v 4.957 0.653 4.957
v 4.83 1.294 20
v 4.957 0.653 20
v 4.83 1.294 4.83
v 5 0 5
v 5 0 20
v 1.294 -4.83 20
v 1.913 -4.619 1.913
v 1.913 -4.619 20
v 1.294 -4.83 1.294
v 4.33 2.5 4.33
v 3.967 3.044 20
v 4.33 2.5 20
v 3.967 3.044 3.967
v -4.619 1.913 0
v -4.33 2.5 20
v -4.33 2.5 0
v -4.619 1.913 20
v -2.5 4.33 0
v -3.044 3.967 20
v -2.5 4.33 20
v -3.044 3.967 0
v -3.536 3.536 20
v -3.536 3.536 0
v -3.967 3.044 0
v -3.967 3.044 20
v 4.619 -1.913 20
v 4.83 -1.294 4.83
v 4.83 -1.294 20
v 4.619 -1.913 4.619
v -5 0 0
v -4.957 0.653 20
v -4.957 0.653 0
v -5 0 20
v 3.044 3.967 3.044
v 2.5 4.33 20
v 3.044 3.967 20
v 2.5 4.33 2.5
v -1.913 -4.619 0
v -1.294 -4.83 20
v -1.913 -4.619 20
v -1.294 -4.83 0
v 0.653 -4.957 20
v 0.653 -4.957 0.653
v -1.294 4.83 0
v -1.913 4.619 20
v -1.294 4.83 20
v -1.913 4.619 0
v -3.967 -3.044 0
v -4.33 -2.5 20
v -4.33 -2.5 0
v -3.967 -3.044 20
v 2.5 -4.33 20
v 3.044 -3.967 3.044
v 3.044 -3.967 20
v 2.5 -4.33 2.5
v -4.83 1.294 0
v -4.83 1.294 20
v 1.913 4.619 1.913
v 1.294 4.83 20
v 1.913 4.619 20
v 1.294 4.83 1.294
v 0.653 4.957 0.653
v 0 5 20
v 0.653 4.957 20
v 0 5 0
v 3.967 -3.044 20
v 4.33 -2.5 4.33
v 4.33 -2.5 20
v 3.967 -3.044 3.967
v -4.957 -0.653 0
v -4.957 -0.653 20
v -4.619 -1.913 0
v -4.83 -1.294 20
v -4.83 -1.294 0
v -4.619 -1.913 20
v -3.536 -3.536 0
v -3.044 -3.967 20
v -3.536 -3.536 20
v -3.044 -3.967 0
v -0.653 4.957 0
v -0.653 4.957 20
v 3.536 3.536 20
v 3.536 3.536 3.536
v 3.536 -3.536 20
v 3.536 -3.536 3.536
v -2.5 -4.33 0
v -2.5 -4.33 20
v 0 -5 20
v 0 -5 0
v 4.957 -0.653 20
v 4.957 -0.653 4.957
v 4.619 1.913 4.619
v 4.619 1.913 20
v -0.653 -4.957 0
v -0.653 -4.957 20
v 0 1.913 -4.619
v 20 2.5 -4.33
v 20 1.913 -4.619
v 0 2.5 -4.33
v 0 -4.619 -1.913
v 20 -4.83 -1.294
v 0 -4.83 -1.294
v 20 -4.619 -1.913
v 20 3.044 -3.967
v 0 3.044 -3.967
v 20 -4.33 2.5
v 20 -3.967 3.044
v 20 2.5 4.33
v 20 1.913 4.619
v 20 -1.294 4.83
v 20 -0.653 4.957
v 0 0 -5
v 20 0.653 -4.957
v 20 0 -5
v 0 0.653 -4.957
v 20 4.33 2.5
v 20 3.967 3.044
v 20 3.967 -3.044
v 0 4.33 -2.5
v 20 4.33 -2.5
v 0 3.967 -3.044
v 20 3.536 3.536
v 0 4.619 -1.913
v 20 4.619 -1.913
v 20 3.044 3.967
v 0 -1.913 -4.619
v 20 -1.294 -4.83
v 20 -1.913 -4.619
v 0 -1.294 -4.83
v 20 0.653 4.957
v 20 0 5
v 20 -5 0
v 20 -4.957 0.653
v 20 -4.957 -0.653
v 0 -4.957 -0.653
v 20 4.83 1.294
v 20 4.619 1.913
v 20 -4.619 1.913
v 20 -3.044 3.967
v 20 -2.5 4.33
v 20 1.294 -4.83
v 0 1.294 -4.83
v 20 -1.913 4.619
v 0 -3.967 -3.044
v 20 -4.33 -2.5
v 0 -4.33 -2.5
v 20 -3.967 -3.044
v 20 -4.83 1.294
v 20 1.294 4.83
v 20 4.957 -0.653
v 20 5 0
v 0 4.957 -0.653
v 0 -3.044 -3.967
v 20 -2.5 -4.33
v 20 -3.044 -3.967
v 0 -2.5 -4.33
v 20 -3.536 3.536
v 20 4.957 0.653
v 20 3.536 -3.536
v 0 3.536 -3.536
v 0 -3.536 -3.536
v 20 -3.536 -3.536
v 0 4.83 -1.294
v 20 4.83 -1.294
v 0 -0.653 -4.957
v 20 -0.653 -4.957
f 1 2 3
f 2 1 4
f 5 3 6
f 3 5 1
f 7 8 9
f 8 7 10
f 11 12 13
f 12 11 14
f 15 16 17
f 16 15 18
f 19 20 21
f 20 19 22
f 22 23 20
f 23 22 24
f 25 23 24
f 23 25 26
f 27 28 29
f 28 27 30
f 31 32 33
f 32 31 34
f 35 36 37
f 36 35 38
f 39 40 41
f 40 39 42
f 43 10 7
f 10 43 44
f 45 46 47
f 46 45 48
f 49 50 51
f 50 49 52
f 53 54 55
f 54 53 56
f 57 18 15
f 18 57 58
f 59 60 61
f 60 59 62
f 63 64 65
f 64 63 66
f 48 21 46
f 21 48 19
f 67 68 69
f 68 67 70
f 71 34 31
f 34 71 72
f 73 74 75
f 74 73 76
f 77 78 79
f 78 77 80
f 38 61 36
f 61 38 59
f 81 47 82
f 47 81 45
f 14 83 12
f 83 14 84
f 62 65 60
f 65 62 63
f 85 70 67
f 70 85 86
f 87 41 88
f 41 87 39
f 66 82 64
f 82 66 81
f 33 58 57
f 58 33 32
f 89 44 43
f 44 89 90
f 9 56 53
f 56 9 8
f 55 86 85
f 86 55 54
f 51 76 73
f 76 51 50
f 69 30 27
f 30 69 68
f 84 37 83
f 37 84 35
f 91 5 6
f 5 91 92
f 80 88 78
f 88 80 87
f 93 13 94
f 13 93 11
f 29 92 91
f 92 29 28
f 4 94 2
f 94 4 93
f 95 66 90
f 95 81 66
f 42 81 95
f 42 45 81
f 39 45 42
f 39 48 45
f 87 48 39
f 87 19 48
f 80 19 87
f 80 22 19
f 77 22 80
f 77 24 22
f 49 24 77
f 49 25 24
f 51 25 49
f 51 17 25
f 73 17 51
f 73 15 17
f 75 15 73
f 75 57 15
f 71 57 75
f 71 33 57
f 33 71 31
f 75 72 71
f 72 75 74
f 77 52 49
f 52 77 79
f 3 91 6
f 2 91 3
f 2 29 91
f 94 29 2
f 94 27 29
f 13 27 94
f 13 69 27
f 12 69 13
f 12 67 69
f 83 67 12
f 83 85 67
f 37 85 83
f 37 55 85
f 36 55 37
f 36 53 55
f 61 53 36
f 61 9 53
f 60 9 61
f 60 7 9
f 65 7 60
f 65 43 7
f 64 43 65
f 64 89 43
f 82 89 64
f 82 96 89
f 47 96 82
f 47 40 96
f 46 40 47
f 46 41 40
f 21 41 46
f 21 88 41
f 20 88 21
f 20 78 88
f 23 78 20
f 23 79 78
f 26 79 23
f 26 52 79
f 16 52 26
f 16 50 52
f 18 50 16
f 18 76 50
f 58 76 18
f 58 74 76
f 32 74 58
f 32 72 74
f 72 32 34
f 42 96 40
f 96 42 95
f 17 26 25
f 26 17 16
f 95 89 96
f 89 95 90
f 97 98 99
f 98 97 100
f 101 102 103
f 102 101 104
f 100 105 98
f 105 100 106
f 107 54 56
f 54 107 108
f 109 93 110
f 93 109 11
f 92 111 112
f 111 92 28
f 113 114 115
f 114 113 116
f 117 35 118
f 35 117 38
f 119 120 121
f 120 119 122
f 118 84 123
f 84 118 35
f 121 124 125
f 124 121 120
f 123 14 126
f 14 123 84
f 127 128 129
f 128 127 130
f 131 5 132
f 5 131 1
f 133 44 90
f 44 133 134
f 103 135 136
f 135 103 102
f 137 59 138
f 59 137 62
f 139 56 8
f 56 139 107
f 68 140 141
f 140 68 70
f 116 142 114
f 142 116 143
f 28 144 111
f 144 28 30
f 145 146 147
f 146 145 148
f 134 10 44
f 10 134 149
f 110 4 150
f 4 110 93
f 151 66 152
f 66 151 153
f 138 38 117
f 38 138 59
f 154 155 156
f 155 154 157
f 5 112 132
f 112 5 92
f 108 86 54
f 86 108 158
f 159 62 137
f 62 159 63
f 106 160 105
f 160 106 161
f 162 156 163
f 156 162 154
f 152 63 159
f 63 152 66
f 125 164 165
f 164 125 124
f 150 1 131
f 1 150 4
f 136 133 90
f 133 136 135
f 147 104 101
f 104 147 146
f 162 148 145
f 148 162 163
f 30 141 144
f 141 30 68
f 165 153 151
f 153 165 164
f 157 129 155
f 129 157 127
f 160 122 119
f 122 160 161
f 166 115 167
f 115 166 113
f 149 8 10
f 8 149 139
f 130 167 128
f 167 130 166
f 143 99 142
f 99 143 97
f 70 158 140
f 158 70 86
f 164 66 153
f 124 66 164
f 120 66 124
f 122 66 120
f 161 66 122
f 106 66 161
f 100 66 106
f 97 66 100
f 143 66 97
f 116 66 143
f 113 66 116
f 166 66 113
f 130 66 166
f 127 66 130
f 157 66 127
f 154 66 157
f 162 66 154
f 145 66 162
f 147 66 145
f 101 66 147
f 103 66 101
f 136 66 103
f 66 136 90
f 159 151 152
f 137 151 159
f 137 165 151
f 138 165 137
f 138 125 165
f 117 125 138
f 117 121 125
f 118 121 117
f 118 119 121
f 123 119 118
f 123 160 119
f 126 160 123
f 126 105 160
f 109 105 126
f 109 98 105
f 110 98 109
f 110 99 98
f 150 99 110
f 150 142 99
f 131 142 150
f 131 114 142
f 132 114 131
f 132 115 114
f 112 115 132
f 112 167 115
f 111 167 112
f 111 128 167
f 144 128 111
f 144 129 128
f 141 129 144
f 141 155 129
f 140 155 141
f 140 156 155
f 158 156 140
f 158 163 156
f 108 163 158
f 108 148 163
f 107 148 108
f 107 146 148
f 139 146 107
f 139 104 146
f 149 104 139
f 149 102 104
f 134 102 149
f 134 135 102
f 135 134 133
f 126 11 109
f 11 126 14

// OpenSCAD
$fn=48;

color("green",1.0) 
	cylinder(r=5, h=20);
color("red",1.0) 
	rotate([0,90,0]) 
		cylinder(r=5, h=20);
